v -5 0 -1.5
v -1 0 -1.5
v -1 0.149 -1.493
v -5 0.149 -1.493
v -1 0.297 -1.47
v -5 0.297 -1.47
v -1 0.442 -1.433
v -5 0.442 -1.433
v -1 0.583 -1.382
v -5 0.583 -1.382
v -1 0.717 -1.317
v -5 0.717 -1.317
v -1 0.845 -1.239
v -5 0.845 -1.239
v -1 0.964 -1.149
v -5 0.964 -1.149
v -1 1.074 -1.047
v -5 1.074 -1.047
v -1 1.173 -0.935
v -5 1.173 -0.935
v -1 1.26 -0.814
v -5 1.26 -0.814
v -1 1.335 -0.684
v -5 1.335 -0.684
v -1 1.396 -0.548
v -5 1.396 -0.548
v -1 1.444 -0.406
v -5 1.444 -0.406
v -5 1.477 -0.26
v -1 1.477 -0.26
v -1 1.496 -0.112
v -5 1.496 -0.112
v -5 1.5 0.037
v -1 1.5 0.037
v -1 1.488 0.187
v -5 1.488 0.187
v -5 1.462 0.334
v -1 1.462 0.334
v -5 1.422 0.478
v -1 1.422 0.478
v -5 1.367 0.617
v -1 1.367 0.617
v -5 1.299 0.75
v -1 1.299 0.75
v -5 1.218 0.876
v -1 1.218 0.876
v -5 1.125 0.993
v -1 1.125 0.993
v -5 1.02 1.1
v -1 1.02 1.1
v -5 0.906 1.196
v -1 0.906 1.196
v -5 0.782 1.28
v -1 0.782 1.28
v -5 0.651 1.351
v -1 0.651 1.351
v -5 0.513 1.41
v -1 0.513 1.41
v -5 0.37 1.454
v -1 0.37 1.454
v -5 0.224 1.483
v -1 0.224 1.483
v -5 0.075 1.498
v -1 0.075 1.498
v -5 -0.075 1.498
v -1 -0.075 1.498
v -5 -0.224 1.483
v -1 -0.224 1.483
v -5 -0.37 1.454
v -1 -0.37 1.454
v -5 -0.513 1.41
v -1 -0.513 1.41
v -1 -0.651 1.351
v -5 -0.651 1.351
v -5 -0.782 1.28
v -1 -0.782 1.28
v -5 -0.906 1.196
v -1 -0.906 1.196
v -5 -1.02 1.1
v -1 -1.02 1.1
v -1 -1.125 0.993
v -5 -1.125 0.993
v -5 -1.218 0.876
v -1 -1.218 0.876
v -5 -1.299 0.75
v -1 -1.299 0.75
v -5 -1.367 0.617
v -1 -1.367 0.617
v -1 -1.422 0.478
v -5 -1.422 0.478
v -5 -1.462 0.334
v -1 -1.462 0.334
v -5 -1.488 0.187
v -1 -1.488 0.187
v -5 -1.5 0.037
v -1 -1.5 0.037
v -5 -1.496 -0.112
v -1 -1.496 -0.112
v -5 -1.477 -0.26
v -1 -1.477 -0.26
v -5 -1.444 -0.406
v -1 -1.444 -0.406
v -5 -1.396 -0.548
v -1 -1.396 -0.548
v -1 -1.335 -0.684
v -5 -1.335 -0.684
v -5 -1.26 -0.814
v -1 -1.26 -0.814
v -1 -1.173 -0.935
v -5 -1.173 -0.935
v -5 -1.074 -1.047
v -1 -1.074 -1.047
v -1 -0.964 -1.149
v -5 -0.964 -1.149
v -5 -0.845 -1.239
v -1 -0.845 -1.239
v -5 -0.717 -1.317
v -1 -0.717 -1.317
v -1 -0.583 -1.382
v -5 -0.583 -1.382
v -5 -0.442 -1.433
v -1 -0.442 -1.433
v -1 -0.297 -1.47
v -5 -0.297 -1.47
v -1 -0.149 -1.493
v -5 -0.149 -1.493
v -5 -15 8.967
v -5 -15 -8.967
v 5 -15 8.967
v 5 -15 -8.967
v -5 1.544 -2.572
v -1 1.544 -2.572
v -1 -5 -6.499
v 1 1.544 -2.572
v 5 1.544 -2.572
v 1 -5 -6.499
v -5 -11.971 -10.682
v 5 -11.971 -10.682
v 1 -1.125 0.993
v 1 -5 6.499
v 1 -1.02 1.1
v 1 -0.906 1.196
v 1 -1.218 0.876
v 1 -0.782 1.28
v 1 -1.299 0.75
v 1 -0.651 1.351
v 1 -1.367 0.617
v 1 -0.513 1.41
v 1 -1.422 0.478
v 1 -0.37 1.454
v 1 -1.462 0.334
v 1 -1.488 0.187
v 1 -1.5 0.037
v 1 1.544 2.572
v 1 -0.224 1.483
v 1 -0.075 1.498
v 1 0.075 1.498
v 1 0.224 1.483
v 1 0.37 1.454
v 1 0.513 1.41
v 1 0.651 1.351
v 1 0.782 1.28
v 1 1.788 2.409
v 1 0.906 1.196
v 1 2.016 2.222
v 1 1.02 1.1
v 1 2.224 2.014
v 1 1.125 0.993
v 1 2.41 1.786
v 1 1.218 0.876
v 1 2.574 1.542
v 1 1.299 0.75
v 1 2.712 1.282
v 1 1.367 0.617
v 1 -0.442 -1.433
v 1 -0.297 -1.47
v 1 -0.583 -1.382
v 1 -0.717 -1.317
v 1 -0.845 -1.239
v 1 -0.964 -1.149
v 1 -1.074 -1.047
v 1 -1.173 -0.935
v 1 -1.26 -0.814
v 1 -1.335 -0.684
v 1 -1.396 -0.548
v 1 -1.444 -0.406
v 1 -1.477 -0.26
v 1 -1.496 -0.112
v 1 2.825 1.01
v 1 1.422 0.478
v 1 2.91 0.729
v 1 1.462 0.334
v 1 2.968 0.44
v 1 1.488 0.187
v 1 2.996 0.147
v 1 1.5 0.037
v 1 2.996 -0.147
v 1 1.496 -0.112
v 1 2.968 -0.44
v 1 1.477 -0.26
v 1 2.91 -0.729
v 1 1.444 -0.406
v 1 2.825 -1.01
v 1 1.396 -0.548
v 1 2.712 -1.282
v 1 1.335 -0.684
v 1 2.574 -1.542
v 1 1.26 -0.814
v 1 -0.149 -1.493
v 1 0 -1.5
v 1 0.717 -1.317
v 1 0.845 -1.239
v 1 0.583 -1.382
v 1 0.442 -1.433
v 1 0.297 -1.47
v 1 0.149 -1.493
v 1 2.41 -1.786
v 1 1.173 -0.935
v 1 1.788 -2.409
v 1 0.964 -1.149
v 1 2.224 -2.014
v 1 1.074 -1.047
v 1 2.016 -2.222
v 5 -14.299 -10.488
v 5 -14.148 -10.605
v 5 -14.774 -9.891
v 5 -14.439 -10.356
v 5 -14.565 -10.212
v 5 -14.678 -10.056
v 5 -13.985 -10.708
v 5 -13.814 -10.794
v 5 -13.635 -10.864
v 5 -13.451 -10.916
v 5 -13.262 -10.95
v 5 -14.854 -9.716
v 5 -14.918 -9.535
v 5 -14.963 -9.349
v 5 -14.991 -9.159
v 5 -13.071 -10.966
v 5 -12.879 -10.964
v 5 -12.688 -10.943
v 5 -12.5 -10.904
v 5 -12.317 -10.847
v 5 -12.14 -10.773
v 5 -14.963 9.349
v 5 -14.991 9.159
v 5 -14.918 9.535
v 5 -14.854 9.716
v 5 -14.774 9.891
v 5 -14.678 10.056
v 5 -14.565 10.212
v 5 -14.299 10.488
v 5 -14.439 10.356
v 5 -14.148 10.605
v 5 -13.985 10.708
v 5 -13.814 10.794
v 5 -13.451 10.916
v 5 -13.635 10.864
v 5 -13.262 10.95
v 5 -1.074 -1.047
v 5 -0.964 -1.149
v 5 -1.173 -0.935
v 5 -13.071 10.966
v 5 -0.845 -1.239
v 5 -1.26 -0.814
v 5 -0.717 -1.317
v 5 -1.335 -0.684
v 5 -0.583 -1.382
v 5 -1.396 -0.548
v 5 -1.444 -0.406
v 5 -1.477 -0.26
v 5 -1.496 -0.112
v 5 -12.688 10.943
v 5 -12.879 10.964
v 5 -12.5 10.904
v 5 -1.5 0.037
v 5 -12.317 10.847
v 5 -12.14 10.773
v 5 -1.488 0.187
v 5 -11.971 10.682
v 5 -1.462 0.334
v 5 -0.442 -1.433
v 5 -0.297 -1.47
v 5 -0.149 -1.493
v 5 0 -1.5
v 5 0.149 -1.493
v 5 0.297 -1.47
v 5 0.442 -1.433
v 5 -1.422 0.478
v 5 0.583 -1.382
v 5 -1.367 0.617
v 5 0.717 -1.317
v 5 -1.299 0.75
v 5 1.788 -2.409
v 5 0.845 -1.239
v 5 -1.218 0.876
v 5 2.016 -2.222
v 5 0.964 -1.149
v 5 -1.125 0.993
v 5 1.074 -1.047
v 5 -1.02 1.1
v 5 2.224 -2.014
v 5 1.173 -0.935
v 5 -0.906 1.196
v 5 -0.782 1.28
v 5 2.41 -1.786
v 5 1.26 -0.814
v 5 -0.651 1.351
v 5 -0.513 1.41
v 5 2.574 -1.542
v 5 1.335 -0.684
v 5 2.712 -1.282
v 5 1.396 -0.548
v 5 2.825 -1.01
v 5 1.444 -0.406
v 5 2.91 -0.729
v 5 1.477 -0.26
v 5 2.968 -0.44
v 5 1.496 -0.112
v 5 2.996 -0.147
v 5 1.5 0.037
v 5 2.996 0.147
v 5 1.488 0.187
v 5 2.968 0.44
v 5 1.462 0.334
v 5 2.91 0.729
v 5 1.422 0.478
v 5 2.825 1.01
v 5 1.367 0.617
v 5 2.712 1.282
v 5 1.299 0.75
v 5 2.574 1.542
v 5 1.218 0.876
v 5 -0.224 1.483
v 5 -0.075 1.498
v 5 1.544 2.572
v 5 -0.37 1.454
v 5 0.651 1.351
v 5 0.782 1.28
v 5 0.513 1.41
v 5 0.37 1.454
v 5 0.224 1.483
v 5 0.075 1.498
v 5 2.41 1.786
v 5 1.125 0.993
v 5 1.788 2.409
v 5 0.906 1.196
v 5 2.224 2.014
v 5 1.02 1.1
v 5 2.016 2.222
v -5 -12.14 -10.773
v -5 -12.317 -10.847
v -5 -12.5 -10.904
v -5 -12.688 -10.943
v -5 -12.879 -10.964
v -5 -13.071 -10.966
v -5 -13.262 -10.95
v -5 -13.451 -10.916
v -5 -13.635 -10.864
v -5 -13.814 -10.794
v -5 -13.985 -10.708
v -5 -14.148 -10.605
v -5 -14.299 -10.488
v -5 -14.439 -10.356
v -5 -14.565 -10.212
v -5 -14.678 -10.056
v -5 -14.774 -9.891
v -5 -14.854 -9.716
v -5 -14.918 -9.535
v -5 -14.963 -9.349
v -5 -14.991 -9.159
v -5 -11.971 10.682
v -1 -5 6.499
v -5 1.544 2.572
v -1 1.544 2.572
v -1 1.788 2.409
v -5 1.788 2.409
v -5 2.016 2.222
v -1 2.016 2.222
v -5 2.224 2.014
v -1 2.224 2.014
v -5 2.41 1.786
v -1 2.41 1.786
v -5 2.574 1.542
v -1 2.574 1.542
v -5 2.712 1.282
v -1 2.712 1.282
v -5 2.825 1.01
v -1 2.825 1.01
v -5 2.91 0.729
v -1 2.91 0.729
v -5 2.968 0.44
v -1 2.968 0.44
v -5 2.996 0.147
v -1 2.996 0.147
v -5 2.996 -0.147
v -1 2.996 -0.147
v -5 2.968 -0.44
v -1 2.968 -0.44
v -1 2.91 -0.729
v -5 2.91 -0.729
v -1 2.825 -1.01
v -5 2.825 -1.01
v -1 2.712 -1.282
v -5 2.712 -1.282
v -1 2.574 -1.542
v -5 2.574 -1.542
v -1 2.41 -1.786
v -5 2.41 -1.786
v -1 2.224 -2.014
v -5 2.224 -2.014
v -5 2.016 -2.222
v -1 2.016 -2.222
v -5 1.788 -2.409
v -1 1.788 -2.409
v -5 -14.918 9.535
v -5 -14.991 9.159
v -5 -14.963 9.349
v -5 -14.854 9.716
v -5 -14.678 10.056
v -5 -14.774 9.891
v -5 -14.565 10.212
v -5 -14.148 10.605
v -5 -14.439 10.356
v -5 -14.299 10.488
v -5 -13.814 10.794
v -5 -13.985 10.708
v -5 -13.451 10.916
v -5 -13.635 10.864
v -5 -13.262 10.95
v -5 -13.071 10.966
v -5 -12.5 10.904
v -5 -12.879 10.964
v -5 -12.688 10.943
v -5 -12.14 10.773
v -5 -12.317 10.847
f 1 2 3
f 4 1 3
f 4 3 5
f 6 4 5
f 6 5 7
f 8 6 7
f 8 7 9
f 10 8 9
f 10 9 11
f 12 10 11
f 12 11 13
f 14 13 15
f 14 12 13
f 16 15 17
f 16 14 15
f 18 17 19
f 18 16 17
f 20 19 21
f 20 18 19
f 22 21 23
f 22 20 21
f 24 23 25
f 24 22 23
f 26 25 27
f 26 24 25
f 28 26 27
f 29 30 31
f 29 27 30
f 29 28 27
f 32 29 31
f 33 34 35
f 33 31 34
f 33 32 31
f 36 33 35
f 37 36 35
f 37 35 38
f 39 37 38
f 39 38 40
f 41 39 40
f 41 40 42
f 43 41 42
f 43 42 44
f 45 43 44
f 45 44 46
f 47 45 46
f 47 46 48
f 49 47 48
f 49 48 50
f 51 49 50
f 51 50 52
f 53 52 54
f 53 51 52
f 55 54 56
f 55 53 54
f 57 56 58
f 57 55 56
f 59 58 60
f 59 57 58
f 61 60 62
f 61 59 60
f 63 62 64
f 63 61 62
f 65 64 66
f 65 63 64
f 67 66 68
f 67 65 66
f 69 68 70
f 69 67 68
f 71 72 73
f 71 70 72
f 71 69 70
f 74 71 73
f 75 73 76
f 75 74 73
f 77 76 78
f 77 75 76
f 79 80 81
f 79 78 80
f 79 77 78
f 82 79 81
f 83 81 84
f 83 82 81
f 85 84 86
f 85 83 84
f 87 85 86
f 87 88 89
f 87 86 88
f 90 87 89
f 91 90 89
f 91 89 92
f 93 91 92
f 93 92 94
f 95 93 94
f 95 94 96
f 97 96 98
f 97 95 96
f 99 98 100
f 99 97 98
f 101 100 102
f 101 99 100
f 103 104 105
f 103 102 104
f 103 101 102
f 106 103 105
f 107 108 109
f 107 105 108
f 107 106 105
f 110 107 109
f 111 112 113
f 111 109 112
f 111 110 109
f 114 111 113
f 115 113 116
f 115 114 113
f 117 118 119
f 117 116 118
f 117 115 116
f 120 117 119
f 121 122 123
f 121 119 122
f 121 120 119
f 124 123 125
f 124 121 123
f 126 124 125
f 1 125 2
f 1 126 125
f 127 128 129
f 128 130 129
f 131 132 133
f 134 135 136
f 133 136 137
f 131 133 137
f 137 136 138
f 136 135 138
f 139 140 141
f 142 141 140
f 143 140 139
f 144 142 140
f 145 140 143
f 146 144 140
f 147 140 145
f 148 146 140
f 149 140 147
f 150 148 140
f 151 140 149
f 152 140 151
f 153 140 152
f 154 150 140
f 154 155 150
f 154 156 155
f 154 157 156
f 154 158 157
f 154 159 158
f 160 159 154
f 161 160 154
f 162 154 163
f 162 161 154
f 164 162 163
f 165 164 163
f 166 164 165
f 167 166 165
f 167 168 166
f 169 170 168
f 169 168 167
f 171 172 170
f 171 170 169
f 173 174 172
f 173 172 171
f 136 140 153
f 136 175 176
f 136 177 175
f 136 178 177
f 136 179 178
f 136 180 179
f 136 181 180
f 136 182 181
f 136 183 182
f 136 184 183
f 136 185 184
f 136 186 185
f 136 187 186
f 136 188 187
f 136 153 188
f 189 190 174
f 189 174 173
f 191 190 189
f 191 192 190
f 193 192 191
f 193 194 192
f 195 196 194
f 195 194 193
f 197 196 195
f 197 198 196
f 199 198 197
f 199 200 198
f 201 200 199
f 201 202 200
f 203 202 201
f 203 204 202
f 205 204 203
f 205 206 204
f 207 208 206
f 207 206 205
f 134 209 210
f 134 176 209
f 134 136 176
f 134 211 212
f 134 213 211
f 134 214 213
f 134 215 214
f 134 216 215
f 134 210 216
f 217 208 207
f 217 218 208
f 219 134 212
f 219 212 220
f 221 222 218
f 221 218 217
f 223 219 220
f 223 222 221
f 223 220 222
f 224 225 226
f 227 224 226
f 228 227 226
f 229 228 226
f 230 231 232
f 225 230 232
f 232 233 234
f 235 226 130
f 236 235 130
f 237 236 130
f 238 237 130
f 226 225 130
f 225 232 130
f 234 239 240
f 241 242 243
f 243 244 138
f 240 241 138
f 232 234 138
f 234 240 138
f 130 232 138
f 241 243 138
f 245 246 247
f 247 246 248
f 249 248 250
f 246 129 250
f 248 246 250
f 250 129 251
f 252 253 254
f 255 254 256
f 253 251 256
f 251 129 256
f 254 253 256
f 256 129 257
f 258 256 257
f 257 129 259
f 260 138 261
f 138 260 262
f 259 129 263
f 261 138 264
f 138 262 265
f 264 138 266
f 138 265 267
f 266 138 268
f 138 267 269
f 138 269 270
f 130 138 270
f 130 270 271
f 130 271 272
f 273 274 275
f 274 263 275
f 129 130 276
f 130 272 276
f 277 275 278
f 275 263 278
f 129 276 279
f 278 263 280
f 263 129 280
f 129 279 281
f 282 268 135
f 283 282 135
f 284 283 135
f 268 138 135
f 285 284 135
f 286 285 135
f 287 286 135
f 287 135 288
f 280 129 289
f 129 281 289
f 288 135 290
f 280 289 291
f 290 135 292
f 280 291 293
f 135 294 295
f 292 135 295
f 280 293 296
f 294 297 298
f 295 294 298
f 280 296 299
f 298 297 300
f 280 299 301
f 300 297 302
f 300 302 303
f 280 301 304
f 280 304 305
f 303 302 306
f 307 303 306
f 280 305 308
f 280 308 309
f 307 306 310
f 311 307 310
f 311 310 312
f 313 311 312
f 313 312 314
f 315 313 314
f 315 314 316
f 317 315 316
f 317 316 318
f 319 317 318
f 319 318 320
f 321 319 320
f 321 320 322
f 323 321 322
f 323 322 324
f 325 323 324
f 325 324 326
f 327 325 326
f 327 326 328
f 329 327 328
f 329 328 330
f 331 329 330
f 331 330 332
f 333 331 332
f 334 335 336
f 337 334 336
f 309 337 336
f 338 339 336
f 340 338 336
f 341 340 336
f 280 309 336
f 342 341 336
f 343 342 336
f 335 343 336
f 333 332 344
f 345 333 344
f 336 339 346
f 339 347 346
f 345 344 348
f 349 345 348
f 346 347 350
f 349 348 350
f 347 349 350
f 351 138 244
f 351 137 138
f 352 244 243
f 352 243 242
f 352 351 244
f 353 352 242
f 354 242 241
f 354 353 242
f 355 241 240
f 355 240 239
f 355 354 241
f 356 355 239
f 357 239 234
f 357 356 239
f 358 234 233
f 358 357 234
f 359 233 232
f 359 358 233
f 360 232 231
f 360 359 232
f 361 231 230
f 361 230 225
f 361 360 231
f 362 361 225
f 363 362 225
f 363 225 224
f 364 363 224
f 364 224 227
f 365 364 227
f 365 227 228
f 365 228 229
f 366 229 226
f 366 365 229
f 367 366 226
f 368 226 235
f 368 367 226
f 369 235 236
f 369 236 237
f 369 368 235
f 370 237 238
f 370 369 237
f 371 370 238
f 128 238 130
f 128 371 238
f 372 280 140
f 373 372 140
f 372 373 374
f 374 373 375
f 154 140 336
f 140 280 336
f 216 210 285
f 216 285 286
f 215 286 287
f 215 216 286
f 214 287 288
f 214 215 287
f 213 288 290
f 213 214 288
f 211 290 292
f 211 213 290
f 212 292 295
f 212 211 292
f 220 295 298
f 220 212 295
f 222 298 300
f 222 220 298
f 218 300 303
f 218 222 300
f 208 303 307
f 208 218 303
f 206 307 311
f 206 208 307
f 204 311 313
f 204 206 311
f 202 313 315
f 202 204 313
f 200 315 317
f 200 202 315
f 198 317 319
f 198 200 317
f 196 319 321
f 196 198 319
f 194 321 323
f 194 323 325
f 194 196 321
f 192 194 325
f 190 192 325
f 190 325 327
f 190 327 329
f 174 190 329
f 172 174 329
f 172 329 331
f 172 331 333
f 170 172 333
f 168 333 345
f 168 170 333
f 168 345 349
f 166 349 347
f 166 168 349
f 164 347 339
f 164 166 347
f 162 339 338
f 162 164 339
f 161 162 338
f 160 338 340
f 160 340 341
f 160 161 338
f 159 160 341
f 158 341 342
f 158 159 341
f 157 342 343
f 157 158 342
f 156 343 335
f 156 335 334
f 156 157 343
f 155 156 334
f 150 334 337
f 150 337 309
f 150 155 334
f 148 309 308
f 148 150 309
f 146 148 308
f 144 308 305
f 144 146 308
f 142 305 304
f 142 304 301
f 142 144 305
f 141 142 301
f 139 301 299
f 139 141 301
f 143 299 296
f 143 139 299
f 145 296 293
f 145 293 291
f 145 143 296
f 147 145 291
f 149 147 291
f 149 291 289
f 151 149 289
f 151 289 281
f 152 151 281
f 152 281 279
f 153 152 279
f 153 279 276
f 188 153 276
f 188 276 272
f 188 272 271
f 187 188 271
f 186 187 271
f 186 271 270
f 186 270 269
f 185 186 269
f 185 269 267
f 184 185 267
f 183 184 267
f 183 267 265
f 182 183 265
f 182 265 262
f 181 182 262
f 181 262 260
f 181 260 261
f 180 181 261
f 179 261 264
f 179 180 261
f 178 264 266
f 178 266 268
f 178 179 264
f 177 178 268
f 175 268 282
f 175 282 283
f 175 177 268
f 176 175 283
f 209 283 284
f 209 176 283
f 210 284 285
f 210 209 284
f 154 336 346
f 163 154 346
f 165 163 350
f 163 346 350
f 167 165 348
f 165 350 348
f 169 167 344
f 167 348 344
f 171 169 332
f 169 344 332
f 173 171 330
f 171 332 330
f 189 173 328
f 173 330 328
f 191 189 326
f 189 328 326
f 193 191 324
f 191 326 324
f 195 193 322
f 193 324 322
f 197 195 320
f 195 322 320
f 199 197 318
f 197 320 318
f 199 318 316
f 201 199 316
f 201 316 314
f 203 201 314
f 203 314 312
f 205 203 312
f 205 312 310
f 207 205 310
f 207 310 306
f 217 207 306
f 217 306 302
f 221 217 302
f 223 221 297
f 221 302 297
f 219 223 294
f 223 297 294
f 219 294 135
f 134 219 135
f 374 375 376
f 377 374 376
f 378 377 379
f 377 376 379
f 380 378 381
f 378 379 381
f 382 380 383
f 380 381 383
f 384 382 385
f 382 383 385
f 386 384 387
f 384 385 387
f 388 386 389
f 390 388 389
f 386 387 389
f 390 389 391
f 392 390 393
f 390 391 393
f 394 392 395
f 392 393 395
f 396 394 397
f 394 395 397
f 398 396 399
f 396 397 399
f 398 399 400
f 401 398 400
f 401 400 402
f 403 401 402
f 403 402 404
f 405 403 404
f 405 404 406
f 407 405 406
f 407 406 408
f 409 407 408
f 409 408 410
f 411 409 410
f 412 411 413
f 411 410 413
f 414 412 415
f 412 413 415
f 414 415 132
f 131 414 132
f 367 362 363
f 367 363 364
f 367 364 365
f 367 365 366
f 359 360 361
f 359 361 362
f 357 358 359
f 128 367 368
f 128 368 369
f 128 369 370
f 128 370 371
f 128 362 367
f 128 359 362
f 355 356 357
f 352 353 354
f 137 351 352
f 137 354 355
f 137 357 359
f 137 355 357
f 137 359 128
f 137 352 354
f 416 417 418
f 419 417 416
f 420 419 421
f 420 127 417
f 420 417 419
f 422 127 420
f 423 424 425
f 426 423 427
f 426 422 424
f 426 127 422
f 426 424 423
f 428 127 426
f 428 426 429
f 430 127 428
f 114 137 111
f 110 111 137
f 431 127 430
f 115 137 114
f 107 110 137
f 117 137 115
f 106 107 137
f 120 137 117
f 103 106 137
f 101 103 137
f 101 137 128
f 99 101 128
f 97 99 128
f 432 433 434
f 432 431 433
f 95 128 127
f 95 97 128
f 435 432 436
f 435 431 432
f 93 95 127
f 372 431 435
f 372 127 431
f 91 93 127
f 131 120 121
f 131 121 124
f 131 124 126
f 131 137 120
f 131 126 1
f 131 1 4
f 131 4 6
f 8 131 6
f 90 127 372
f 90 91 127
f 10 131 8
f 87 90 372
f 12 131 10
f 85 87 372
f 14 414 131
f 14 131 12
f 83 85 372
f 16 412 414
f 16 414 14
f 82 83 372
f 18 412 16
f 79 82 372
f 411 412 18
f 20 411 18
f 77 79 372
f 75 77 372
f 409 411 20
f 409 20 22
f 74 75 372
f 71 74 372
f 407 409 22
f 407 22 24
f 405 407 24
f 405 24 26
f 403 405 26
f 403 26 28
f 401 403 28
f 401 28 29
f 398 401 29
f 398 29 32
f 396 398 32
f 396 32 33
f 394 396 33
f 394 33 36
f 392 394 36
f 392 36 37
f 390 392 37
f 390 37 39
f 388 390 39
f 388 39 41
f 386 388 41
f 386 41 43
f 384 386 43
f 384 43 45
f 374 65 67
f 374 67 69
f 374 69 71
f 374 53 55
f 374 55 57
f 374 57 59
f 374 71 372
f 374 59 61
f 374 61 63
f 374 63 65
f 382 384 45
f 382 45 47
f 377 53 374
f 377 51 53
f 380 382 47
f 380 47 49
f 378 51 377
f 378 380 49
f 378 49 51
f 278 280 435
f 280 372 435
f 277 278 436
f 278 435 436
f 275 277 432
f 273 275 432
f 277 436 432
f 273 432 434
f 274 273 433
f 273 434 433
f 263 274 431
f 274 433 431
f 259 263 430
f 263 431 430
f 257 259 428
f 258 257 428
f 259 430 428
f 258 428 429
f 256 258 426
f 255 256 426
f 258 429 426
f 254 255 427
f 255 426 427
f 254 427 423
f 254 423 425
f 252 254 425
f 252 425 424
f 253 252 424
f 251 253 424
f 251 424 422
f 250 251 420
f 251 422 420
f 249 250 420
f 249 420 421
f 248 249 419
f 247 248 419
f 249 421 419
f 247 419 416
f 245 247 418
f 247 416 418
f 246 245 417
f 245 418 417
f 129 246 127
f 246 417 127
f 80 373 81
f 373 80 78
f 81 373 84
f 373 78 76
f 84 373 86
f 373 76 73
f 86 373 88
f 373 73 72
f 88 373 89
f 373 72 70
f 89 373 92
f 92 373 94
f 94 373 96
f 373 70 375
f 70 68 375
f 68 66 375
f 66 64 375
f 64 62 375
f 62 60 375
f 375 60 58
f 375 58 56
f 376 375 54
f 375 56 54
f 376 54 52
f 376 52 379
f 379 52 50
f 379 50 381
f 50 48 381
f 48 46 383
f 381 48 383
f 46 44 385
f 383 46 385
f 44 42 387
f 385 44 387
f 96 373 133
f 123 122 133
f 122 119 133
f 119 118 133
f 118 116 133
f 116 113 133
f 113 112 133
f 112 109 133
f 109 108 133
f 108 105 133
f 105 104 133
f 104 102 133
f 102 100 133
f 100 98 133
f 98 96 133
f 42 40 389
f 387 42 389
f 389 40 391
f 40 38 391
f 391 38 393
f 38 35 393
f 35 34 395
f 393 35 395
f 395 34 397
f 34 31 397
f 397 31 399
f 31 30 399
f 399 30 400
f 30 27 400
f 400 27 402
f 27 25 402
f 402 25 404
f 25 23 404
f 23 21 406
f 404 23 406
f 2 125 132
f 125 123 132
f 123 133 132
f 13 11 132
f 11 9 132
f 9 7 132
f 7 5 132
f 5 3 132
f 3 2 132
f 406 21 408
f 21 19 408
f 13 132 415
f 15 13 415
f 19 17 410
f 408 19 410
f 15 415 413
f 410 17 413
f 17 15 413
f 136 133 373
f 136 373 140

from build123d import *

# Parameters (mm, degrees)
ESQUISSE1_R                  = 1.5
BOSS_EXTRU_1_DEPTH           = 5
ENL_V_MAT_EXTRU_1_DEPTH      = 21.155644371
ENL_V_MAT_EXTRU_1_DEPTH_BACK = 21.155644371
ESQUISSE2_W                  = 2
ESQUISSE2_H                  = 8
CONG_1_R                     = 2


with BuildPart() as part:
    # Esquisse1 → Boss.-Extru.1 (new, symmetric)
    with BuildSketch(Plane(origin=(0, 0, 0), x_dir=(0, 0, -1), z_dir=(1, 0, 0))):
        with BuildLine():
            Line((2.572380753, 1.543650628), (12.5, -15))
            Line((12.5, -15), (-12.5, -15))
            Line((-12.5, -15), (-2.572380753, 1.543650628))
            ThreePointArc((-2.572380753, 1.543650628), (0, 3), (2.572380753, 1.543650628))
        make_face()
        Circle(ESQUISSE1_R, mode=Mode.SUBTRACT)
    extrude(amount=BOSS_EXTRU_1_DEPTH, both=True)

    # Esquisse2 → Enlèv. mat.-Extru.1 (cut, two sides: drawn at the far end of the back side and taken through both)
    with BuildSketch(Plane.XY.offset(-ENL_V_MAT_EXTRU_1_DEPTH_BACK)):
        with Locations((0, -1)):
            Rectangle(ESQUISSE2_W, ESQUISSE2_H)
    extrude(amount=ENL_V_MAT_EXTRU_1_DEPTH + ENL_V_MAT_EXTRU_1_DEPTH_BACK, mode=Mode.SUBTRACT)

    # Congé1
    cong_1_edges = [part.edges().sort_by_distance(p)[0] for p in [
        (0, -15, -12.5),
        (0, -15, 12.5),
    ]]
    fillet(cong_1_edges, radius=CONG_1_R)


solid = part.part
